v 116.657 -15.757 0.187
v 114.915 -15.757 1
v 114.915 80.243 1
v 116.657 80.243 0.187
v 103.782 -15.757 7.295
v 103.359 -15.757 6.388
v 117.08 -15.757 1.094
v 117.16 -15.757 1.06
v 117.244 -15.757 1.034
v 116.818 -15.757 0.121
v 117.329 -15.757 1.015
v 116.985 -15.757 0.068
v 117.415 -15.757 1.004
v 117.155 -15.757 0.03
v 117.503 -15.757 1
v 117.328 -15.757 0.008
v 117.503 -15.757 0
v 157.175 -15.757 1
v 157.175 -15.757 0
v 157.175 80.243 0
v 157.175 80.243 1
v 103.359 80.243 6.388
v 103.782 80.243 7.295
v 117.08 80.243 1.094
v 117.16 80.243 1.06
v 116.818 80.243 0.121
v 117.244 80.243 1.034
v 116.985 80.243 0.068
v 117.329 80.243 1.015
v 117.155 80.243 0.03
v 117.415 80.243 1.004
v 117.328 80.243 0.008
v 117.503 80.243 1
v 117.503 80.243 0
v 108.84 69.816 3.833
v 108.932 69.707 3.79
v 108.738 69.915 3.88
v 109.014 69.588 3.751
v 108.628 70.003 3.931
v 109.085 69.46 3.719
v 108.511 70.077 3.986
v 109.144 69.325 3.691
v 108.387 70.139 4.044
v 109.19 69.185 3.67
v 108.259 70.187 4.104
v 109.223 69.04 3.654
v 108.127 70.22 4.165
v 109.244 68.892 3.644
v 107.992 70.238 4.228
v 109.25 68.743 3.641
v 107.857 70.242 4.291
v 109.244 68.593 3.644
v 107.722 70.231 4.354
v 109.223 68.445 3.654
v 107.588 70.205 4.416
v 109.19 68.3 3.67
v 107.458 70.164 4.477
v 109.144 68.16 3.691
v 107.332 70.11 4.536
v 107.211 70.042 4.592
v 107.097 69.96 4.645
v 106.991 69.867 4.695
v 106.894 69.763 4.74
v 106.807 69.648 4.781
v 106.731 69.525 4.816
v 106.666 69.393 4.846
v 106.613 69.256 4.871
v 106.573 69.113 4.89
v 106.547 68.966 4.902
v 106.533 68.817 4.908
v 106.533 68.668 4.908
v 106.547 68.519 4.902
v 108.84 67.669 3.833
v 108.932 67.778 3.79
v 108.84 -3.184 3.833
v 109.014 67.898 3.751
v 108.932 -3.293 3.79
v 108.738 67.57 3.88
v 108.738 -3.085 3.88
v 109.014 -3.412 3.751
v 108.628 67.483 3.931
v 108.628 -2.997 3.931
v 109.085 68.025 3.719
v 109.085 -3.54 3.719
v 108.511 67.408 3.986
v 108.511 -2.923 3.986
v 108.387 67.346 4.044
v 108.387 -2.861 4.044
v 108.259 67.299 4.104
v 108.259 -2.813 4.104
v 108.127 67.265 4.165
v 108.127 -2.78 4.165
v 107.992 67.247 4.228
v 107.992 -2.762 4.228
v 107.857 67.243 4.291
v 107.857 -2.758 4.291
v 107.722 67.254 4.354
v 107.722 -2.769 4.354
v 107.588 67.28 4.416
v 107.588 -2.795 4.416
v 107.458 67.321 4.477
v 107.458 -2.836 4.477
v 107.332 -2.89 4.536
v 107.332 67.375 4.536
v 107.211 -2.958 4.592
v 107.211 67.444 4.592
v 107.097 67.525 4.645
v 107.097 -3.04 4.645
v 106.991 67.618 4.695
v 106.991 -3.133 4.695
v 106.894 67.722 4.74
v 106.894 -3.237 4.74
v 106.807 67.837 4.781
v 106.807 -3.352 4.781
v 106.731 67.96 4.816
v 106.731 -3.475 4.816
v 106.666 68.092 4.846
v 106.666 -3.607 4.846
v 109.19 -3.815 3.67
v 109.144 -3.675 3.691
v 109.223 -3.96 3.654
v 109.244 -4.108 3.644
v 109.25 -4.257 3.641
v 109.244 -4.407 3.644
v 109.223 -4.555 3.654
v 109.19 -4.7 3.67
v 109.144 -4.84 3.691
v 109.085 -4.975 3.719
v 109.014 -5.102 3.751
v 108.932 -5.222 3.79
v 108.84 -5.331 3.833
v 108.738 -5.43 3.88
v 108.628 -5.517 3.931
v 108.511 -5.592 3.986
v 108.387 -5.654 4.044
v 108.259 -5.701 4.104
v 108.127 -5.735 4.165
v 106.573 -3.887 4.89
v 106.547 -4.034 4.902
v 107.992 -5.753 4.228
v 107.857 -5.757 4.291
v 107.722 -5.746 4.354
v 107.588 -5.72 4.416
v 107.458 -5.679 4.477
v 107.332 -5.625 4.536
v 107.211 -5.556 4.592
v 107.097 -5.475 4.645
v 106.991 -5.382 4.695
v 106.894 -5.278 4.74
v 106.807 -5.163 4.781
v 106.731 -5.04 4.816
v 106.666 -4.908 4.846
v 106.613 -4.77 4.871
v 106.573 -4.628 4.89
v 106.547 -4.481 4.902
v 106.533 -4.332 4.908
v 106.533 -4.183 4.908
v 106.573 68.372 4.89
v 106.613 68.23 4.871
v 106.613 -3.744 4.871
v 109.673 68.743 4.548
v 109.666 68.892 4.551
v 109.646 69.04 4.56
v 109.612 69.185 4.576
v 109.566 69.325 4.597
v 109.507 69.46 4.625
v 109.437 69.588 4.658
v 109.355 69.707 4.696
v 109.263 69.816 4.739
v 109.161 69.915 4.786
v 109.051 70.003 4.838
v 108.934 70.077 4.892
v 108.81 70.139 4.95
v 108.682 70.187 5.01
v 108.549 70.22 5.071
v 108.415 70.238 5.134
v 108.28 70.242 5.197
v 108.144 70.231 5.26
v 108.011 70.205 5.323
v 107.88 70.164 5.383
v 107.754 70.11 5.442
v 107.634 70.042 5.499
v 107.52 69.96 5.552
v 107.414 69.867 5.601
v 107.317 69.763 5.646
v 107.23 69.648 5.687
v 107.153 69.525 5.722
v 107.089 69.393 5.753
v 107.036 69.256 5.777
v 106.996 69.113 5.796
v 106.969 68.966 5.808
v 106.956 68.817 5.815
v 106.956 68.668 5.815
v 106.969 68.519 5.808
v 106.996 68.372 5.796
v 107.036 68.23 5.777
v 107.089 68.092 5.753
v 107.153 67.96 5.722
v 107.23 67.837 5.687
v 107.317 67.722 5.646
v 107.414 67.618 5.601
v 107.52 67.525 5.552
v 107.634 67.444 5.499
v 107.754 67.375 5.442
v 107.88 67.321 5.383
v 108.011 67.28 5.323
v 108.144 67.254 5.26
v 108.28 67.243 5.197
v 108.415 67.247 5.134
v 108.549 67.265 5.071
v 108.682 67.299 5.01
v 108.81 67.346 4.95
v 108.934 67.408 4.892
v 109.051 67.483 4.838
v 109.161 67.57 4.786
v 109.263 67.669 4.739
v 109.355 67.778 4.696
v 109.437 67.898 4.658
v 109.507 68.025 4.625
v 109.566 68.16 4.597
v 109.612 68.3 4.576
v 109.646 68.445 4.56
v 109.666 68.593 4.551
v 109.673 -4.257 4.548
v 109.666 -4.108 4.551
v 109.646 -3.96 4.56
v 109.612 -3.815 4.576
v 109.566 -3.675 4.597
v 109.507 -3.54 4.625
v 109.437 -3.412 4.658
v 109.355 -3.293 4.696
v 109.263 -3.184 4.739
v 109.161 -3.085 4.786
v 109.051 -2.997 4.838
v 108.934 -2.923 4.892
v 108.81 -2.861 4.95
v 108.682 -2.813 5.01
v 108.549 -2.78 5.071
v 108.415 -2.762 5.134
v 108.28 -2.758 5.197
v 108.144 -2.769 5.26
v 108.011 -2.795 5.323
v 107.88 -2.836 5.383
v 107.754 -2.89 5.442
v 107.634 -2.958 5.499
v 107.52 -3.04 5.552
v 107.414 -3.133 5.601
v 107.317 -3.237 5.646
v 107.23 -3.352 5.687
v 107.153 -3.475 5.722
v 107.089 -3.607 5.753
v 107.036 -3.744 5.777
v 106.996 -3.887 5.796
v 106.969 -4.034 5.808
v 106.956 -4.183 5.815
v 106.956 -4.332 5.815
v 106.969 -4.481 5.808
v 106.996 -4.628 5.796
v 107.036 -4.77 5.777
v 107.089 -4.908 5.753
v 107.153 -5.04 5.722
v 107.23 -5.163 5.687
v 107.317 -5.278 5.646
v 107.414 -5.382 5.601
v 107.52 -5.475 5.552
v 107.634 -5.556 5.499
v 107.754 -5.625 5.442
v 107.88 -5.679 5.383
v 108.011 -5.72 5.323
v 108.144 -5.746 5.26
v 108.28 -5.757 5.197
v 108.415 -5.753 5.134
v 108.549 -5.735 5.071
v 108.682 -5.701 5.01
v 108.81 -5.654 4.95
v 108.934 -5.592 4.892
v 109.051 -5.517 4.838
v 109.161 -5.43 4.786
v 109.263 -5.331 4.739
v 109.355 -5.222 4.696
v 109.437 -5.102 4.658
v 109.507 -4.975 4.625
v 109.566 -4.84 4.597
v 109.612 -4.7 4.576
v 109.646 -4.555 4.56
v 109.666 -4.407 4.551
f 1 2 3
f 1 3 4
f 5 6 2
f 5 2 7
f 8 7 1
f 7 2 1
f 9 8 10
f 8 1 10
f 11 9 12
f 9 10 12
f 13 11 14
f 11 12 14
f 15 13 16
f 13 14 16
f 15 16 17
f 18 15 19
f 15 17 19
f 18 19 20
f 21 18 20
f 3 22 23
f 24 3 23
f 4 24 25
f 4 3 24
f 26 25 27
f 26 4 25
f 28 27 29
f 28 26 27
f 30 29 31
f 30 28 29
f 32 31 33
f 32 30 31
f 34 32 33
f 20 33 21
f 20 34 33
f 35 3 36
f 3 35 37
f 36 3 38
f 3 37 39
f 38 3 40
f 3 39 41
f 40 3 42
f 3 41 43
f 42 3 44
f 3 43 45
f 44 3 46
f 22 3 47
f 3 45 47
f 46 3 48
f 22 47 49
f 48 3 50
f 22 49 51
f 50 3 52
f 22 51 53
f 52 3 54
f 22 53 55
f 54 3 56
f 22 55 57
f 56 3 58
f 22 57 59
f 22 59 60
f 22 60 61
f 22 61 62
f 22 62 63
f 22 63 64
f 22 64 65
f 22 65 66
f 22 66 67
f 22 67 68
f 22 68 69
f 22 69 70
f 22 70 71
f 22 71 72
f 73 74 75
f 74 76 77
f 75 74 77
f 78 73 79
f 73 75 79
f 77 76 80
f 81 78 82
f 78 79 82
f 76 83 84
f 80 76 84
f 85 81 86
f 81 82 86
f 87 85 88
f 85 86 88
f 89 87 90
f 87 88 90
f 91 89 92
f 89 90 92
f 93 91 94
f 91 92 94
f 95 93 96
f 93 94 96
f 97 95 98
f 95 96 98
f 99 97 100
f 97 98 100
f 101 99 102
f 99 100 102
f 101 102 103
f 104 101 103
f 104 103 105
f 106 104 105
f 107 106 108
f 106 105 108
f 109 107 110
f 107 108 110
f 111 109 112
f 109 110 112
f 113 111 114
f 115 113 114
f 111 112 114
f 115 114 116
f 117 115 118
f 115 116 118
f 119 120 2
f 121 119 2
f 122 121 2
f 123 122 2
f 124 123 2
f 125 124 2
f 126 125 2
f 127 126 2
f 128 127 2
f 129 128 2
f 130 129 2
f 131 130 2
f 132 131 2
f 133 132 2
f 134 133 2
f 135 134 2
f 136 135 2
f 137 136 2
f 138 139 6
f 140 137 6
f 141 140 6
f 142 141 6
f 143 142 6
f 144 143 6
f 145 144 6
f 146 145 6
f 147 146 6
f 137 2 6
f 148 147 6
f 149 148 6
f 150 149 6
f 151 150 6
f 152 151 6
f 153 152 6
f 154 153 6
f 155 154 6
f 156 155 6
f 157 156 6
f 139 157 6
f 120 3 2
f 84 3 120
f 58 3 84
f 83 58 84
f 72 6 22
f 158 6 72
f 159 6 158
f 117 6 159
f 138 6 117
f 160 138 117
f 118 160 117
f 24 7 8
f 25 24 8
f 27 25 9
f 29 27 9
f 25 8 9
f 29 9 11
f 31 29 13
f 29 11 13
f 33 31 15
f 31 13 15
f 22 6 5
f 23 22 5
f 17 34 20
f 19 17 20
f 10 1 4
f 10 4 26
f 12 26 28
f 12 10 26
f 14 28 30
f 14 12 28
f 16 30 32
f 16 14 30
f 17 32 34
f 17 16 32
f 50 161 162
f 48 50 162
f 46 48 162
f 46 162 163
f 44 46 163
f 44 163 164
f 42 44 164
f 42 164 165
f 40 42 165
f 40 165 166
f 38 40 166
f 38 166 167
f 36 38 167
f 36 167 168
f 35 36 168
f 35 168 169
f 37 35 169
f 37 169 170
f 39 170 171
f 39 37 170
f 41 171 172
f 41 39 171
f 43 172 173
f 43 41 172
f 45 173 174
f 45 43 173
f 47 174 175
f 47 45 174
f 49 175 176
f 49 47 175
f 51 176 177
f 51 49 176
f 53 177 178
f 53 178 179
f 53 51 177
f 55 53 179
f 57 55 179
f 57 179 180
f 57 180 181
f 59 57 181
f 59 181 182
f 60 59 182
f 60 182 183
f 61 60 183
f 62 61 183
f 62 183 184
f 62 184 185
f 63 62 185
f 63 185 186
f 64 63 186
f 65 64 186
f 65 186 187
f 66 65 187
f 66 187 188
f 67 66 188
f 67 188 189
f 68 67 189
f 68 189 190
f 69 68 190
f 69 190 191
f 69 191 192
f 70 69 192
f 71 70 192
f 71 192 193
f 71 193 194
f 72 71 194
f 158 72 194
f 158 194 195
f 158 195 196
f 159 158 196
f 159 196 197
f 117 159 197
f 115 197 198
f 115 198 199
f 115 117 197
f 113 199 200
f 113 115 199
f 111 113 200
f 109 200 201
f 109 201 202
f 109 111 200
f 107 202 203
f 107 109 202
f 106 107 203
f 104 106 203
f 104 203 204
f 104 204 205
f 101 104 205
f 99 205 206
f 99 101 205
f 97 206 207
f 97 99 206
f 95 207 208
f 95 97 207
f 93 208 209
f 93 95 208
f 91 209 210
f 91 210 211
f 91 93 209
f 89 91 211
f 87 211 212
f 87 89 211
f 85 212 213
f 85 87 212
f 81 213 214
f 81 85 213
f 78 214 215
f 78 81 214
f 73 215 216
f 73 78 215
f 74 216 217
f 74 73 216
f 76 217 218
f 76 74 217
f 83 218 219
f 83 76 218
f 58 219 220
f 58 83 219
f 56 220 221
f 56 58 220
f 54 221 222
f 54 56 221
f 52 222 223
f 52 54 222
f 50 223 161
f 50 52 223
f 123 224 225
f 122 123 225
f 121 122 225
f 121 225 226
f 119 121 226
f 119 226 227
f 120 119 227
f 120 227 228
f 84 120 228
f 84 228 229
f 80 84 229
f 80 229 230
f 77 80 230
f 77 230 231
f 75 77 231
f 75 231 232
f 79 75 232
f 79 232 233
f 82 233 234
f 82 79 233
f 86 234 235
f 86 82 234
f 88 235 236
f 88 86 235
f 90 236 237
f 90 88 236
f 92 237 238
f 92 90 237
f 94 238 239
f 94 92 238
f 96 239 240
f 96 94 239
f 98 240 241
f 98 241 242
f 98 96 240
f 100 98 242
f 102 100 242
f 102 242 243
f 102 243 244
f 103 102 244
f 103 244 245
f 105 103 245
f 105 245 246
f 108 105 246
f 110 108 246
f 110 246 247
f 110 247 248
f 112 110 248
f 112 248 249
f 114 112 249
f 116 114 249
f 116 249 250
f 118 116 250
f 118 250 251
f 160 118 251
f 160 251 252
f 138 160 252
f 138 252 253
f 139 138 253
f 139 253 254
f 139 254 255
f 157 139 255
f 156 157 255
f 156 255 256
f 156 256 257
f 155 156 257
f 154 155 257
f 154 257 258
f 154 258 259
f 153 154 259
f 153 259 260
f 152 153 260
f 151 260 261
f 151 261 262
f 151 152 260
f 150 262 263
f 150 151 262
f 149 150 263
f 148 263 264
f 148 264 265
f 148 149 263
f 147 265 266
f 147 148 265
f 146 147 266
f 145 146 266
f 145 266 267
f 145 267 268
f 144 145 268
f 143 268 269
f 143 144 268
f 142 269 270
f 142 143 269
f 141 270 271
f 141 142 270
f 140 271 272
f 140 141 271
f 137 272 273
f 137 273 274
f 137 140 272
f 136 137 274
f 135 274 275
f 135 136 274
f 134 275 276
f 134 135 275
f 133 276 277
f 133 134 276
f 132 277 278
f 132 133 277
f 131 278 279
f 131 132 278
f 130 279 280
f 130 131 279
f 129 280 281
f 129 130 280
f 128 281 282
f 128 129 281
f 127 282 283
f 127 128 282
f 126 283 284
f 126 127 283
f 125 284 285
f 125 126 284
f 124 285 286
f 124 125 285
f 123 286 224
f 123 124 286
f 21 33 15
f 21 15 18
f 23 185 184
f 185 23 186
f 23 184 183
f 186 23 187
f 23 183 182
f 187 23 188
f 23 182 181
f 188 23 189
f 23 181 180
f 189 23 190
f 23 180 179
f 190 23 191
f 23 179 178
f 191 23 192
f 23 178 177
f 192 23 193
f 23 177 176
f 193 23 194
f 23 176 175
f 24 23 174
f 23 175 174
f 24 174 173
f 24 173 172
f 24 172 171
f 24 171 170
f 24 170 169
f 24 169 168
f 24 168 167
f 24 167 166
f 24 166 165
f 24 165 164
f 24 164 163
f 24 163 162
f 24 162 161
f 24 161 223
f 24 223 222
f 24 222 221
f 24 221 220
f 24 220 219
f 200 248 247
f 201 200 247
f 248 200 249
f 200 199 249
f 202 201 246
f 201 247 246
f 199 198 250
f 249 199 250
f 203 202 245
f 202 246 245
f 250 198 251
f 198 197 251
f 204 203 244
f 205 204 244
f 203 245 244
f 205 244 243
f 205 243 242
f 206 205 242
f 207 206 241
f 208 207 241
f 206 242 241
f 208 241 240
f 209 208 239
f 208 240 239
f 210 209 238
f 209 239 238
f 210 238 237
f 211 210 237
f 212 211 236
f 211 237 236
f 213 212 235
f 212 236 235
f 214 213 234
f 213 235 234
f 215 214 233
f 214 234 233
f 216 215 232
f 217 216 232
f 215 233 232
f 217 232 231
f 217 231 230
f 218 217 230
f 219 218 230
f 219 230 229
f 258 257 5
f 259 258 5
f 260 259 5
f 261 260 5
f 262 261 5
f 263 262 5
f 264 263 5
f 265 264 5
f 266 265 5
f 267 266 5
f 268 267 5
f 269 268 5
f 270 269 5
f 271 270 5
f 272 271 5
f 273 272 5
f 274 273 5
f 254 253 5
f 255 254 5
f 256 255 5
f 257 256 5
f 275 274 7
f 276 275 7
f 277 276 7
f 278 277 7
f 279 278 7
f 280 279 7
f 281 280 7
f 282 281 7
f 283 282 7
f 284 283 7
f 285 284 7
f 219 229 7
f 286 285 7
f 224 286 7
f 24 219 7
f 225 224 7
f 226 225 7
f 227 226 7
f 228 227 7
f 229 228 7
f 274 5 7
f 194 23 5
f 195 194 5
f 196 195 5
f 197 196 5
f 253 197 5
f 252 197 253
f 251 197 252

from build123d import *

# Parameters (mm, degrees)
IZIM1_W                     = 40
IZIM1_H                     = 96
IZIM1_W_2                   = 15
IZIM1_R                     = 1.5
Y_KSEKLIK_EKSTR_ZYON2_DEPTH = 1
IZGIDEN_START               = 43.181135212
IZGIDEN_B_KME3_OUTLINE_R    = 1.5
IZGIDEN_B_KME3_DEPTH        = 3.071295426
IZGIDEN_START_2             = -15.757423971
IZGIDEN_B_KME3_2_DEPTH      = 96
IZGIDEN_B_KME3_3_DEPTH      = 96
IZGIDEN_START_3             = 48
IZGIDEN_B_KME3_4_OUTLINE_R  = 1.5
IZGIDEN_B_KME3_4_DEPTH      = 2.471326215


with BuildPart() as part:
    # Çizim1 → Yükseklik-Ekstrüzyon2 (new body)
    # profile 1 of 2: a face of its own
    with BuildSketch(Plane.XY):
        with Locations((137.175270501, 32.242576029)):
            Rectangle(IZIM1_W, IZIM1_H)
    # profile 2 of 2: a face of its own
    with BuildSketch(Plane.XY):
        with Locations((109.675270501, 32.242576029)):
            Rectangle(IZIM1_W_2, IZIM1_H)
        with Locations((107.175270501, -4.257423971)):
            Circle(IZIM1_R, mode=Mode.SUBTRACT)
        with Locations((107.175270501, 68.742576029)):
            Circle(IZIM1_R, mode=Mode.SUBTRACT)
    extrude(amount=Y_KSEKLIK_EKSTR_ZYON2_DEPTH)

    # Çizgiden Bükme3: read off the stored shape, not the designer's step
    # Çizgiden Bükme3 outline → Çizgiden Bükme3 (cut)
    with BuildSketch(Plane(origin=(0, 0, 0), x_dir=(0.9063077870366497, 0, -0.42261826174069983), z_dir=(0.4226182617406999, 0, 0.9063077870366498)).offset(IZGIDEN_START)):
        with Locations((95.975461344, -4.257423971)):
            Circle(IZGIDEN_B_KME3_OUTLINE_R)
        with Locations((95.975461344, 68.742576029)):
            Circle(IZGIDEN_B_KME3_OUTLINE_R)
    extrude(amount=IZGIDEN_B_KME3_DEPTH, mode=Mode.SUBTRACT)

    # izgiden B_kme3 2 outline → izgiden B_kme3 2 (cut)
    with BuildSketch(Plane(origin=(0, 0, 0), x_dir=(1, 0, 0), z_dir=(0, 1, 0)).offset(IZGIDEN_START_2)):
        with BuildLine():
            Line((102.175270501, -1), (114.91462349, -1))
            Line((114.91462349, -1), (116.657283212, -0.187384426))
            ThreePointArc((116.657283212, -0.187384426), (117.069640507, -0.047407986), (117.502519735, 0))
            Line((117.502519735, 0), (102.175270501, 0))
            Line((102.175270501, 0), (102.175270501, -1))
        make_face()
    extrude(amount=IZGIDEN_B_KME3_2_DEPTH, mode=Mode.SUBTRACT)

    # izgiden B_kme3 3 outline → izgiden B_kme3 3 (add)
    with BuildSketch(Plane(origin=(0, 0, 0), x_dir=(1, 0, 0), z_dir=(0, 1, 0)).offset(IZGIDEN_START_2)):
        with BuildLine():
            Line((103.359254936, -6.388356849), (103.781873198, -7.294664636))
            Line((103.781873198, -7.294664636), (117.079901474, -1.093692213))
            ThreePointArc((117.079901474, -1.093692213), (117.286080121, -1.023703993), (117.502519735, -1))
            Line((117.502519735, -1), (114.91462349, -1))
            Line((114.91462349, -1), (103.359254936, -6.388356849))
        make_face()
    extrude(amount=IZGIDEN_B_KME3_3_DEPTH)

    # izgiden B_kme3 4 outline → izgiden B_kme3 4 (cut)
    with BuildSketch(Plane(origin=(0, 0, 0), x_dir=(0.9063077870366497, 0, -0.42261826174069983), z_dir=(0.4226182617406999, 0, 0.9063077870366498)).offset(IZGIDEN_START_3)):
        with Locations((95.975461344, -4.257423971)):
            Circle(IZGIDEN_B_KME3_4_OUTLINE_R)
        with Locations((95.975461344, 68.742576029)):
            Circle(IZGIDEN_B_KME3_4_OUTLINE_R)
    extrude(amount=IZGIDEN_B_KME3_4_DEPTH, mode=Mode.SUBTRACT)


solid = part.part
